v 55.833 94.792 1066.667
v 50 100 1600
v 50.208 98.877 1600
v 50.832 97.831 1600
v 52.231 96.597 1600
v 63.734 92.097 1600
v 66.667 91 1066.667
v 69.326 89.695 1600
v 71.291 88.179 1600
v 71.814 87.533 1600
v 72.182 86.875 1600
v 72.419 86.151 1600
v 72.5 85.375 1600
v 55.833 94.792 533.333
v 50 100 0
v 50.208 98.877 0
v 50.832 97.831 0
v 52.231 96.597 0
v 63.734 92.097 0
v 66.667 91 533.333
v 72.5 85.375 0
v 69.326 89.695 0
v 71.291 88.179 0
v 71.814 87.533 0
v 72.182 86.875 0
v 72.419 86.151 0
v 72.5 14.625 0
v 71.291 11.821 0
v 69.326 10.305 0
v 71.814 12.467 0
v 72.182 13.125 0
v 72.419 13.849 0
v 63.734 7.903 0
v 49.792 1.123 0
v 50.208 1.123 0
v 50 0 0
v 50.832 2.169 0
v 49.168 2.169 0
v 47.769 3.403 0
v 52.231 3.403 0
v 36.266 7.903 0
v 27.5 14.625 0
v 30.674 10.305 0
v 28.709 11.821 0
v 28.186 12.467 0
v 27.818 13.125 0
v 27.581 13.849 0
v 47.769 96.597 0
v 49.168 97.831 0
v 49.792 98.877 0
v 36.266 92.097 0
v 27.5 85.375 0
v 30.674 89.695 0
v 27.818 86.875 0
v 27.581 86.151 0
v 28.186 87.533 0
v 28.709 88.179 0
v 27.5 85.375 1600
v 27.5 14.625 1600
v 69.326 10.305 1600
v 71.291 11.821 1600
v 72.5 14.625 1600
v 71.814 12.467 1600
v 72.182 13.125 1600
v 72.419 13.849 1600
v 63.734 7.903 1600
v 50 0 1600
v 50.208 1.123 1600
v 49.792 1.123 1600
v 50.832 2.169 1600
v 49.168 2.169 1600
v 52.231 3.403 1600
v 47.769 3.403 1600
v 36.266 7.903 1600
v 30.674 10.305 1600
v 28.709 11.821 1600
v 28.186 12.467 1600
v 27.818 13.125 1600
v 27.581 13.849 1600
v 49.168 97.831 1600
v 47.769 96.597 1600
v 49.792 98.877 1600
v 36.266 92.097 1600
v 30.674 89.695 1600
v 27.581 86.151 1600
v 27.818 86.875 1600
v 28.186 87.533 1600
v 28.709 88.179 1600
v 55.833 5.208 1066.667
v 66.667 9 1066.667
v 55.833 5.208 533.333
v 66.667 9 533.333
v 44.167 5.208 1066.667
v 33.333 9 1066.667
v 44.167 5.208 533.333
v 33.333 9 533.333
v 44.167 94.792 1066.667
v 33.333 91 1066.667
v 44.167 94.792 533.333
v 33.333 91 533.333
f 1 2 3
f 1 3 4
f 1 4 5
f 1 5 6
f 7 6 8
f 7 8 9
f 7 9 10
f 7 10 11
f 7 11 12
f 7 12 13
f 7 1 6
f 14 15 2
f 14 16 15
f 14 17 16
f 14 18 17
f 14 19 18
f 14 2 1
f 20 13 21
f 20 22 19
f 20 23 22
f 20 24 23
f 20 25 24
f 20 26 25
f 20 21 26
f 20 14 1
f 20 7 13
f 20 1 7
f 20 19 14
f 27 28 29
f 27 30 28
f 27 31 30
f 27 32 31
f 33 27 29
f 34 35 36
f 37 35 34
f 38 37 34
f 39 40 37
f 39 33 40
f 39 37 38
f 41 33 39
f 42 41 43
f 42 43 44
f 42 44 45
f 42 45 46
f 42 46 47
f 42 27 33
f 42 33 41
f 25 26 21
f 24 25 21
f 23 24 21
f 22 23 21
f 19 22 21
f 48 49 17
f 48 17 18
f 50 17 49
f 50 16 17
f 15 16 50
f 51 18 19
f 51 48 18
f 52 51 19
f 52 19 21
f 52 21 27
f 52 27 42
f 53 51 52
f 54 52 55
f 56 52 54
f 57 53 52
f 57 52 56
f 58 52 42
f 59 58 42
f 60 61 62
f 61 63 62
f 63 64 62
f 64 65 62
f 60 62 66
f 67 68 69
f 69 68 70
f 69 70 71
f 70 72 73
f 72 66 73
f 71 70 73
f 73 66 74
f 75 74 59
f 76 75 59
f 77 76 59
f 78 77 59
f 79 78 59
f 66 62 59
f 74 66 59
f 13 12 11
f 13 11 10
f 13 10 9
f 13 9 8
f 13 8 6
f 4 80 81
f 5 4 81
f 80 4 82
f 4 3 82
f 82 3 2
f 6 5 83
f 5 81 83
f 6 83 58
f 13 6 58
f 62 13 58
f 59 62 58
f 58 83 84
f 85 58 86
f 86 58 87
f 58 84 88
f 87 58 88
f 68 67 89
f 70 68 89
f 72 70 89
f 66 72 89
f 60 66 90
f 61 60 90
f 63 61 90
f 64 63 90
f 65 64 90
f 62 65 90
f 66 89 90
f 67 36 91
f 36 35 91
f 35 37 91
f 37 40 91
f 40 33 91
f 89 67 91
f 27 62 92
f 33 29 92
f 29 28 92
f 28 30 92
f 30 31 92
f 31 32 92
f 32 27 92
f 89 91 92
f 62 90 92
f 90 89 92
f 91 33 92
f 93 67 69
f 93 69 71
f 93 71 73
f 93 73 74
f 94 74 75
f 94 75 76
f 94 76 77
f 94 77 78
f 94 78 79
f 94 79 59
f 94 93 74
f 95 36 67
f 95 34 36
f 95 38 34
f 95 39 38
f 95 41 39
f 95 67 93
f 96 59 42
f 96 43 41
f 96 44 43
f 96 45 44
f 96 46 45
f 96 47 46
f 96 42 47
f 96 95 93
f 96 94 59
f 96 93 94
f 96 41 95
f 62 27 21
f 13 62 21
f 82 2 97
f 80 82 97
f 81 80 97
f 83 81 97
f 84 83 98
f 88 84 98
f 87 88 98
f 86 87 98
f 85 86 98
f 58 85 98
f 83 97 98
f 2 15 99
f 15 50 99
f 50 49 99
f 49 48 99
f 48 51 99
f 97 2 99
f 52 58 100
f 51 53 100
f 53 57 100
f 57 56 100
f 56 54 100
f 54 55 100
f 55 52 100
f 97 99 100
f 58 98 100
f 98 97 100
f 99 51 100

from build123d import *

# Parameters (mm, degrees)
F2_DEPTH = 1600


# Not quite as in the source:
# - a feature of the source that left no trace in its solid (it failed there, or was rolled back) is left out


with BuildPart() as f2:
    # F0 (on Top) → F2 (new body)
    with BuildSketch(Plane.XY):
        with BuildLine():
            add(Edge.make_bspline(
                [(50, 0), (50, 7), (27.5, 7), (27.5, 14.625)],
                knots=[0, 0, 0, 0, 26.8354359942, 26.8354359942, 26.8354359942, 26.8354359942], degree=3))
            add(Edge.make_bspline(
                [(50, 0), (50, 7), (72.5, 7), (72.5, 14.625)],
                knots=[0, 0, 0, 0, 26.8354359942, 26.8354359942, 26.8354359942, 26.8354359942], degree=3))
            Line((72.5, 14.625), (72.5, 85.375))
            add(Edge.make_bspline(
                [(50, 100), (50, 93), (72.5, 93), (72.5, 85.375)],
                knots=[0, 0, 0, 0, 26.8354359942, 26.8354359942, 26.8354359942, 26.8354359942], degree=3))
            add(Edge.make_bspline(
                [(50, 100), (50, 93), (27.5, 93), (27.5, 85.375)],
                knots=[0, 0, 0, 0, 26.8354359942, 26.8354359942, 26.8354359942, 26.8354359942], degree=3))
            Line((27.5, 85.375), (27.5, 14.625))
        make_face()
    extrude(amount=F2_DEPTH)


solid = f2.part
